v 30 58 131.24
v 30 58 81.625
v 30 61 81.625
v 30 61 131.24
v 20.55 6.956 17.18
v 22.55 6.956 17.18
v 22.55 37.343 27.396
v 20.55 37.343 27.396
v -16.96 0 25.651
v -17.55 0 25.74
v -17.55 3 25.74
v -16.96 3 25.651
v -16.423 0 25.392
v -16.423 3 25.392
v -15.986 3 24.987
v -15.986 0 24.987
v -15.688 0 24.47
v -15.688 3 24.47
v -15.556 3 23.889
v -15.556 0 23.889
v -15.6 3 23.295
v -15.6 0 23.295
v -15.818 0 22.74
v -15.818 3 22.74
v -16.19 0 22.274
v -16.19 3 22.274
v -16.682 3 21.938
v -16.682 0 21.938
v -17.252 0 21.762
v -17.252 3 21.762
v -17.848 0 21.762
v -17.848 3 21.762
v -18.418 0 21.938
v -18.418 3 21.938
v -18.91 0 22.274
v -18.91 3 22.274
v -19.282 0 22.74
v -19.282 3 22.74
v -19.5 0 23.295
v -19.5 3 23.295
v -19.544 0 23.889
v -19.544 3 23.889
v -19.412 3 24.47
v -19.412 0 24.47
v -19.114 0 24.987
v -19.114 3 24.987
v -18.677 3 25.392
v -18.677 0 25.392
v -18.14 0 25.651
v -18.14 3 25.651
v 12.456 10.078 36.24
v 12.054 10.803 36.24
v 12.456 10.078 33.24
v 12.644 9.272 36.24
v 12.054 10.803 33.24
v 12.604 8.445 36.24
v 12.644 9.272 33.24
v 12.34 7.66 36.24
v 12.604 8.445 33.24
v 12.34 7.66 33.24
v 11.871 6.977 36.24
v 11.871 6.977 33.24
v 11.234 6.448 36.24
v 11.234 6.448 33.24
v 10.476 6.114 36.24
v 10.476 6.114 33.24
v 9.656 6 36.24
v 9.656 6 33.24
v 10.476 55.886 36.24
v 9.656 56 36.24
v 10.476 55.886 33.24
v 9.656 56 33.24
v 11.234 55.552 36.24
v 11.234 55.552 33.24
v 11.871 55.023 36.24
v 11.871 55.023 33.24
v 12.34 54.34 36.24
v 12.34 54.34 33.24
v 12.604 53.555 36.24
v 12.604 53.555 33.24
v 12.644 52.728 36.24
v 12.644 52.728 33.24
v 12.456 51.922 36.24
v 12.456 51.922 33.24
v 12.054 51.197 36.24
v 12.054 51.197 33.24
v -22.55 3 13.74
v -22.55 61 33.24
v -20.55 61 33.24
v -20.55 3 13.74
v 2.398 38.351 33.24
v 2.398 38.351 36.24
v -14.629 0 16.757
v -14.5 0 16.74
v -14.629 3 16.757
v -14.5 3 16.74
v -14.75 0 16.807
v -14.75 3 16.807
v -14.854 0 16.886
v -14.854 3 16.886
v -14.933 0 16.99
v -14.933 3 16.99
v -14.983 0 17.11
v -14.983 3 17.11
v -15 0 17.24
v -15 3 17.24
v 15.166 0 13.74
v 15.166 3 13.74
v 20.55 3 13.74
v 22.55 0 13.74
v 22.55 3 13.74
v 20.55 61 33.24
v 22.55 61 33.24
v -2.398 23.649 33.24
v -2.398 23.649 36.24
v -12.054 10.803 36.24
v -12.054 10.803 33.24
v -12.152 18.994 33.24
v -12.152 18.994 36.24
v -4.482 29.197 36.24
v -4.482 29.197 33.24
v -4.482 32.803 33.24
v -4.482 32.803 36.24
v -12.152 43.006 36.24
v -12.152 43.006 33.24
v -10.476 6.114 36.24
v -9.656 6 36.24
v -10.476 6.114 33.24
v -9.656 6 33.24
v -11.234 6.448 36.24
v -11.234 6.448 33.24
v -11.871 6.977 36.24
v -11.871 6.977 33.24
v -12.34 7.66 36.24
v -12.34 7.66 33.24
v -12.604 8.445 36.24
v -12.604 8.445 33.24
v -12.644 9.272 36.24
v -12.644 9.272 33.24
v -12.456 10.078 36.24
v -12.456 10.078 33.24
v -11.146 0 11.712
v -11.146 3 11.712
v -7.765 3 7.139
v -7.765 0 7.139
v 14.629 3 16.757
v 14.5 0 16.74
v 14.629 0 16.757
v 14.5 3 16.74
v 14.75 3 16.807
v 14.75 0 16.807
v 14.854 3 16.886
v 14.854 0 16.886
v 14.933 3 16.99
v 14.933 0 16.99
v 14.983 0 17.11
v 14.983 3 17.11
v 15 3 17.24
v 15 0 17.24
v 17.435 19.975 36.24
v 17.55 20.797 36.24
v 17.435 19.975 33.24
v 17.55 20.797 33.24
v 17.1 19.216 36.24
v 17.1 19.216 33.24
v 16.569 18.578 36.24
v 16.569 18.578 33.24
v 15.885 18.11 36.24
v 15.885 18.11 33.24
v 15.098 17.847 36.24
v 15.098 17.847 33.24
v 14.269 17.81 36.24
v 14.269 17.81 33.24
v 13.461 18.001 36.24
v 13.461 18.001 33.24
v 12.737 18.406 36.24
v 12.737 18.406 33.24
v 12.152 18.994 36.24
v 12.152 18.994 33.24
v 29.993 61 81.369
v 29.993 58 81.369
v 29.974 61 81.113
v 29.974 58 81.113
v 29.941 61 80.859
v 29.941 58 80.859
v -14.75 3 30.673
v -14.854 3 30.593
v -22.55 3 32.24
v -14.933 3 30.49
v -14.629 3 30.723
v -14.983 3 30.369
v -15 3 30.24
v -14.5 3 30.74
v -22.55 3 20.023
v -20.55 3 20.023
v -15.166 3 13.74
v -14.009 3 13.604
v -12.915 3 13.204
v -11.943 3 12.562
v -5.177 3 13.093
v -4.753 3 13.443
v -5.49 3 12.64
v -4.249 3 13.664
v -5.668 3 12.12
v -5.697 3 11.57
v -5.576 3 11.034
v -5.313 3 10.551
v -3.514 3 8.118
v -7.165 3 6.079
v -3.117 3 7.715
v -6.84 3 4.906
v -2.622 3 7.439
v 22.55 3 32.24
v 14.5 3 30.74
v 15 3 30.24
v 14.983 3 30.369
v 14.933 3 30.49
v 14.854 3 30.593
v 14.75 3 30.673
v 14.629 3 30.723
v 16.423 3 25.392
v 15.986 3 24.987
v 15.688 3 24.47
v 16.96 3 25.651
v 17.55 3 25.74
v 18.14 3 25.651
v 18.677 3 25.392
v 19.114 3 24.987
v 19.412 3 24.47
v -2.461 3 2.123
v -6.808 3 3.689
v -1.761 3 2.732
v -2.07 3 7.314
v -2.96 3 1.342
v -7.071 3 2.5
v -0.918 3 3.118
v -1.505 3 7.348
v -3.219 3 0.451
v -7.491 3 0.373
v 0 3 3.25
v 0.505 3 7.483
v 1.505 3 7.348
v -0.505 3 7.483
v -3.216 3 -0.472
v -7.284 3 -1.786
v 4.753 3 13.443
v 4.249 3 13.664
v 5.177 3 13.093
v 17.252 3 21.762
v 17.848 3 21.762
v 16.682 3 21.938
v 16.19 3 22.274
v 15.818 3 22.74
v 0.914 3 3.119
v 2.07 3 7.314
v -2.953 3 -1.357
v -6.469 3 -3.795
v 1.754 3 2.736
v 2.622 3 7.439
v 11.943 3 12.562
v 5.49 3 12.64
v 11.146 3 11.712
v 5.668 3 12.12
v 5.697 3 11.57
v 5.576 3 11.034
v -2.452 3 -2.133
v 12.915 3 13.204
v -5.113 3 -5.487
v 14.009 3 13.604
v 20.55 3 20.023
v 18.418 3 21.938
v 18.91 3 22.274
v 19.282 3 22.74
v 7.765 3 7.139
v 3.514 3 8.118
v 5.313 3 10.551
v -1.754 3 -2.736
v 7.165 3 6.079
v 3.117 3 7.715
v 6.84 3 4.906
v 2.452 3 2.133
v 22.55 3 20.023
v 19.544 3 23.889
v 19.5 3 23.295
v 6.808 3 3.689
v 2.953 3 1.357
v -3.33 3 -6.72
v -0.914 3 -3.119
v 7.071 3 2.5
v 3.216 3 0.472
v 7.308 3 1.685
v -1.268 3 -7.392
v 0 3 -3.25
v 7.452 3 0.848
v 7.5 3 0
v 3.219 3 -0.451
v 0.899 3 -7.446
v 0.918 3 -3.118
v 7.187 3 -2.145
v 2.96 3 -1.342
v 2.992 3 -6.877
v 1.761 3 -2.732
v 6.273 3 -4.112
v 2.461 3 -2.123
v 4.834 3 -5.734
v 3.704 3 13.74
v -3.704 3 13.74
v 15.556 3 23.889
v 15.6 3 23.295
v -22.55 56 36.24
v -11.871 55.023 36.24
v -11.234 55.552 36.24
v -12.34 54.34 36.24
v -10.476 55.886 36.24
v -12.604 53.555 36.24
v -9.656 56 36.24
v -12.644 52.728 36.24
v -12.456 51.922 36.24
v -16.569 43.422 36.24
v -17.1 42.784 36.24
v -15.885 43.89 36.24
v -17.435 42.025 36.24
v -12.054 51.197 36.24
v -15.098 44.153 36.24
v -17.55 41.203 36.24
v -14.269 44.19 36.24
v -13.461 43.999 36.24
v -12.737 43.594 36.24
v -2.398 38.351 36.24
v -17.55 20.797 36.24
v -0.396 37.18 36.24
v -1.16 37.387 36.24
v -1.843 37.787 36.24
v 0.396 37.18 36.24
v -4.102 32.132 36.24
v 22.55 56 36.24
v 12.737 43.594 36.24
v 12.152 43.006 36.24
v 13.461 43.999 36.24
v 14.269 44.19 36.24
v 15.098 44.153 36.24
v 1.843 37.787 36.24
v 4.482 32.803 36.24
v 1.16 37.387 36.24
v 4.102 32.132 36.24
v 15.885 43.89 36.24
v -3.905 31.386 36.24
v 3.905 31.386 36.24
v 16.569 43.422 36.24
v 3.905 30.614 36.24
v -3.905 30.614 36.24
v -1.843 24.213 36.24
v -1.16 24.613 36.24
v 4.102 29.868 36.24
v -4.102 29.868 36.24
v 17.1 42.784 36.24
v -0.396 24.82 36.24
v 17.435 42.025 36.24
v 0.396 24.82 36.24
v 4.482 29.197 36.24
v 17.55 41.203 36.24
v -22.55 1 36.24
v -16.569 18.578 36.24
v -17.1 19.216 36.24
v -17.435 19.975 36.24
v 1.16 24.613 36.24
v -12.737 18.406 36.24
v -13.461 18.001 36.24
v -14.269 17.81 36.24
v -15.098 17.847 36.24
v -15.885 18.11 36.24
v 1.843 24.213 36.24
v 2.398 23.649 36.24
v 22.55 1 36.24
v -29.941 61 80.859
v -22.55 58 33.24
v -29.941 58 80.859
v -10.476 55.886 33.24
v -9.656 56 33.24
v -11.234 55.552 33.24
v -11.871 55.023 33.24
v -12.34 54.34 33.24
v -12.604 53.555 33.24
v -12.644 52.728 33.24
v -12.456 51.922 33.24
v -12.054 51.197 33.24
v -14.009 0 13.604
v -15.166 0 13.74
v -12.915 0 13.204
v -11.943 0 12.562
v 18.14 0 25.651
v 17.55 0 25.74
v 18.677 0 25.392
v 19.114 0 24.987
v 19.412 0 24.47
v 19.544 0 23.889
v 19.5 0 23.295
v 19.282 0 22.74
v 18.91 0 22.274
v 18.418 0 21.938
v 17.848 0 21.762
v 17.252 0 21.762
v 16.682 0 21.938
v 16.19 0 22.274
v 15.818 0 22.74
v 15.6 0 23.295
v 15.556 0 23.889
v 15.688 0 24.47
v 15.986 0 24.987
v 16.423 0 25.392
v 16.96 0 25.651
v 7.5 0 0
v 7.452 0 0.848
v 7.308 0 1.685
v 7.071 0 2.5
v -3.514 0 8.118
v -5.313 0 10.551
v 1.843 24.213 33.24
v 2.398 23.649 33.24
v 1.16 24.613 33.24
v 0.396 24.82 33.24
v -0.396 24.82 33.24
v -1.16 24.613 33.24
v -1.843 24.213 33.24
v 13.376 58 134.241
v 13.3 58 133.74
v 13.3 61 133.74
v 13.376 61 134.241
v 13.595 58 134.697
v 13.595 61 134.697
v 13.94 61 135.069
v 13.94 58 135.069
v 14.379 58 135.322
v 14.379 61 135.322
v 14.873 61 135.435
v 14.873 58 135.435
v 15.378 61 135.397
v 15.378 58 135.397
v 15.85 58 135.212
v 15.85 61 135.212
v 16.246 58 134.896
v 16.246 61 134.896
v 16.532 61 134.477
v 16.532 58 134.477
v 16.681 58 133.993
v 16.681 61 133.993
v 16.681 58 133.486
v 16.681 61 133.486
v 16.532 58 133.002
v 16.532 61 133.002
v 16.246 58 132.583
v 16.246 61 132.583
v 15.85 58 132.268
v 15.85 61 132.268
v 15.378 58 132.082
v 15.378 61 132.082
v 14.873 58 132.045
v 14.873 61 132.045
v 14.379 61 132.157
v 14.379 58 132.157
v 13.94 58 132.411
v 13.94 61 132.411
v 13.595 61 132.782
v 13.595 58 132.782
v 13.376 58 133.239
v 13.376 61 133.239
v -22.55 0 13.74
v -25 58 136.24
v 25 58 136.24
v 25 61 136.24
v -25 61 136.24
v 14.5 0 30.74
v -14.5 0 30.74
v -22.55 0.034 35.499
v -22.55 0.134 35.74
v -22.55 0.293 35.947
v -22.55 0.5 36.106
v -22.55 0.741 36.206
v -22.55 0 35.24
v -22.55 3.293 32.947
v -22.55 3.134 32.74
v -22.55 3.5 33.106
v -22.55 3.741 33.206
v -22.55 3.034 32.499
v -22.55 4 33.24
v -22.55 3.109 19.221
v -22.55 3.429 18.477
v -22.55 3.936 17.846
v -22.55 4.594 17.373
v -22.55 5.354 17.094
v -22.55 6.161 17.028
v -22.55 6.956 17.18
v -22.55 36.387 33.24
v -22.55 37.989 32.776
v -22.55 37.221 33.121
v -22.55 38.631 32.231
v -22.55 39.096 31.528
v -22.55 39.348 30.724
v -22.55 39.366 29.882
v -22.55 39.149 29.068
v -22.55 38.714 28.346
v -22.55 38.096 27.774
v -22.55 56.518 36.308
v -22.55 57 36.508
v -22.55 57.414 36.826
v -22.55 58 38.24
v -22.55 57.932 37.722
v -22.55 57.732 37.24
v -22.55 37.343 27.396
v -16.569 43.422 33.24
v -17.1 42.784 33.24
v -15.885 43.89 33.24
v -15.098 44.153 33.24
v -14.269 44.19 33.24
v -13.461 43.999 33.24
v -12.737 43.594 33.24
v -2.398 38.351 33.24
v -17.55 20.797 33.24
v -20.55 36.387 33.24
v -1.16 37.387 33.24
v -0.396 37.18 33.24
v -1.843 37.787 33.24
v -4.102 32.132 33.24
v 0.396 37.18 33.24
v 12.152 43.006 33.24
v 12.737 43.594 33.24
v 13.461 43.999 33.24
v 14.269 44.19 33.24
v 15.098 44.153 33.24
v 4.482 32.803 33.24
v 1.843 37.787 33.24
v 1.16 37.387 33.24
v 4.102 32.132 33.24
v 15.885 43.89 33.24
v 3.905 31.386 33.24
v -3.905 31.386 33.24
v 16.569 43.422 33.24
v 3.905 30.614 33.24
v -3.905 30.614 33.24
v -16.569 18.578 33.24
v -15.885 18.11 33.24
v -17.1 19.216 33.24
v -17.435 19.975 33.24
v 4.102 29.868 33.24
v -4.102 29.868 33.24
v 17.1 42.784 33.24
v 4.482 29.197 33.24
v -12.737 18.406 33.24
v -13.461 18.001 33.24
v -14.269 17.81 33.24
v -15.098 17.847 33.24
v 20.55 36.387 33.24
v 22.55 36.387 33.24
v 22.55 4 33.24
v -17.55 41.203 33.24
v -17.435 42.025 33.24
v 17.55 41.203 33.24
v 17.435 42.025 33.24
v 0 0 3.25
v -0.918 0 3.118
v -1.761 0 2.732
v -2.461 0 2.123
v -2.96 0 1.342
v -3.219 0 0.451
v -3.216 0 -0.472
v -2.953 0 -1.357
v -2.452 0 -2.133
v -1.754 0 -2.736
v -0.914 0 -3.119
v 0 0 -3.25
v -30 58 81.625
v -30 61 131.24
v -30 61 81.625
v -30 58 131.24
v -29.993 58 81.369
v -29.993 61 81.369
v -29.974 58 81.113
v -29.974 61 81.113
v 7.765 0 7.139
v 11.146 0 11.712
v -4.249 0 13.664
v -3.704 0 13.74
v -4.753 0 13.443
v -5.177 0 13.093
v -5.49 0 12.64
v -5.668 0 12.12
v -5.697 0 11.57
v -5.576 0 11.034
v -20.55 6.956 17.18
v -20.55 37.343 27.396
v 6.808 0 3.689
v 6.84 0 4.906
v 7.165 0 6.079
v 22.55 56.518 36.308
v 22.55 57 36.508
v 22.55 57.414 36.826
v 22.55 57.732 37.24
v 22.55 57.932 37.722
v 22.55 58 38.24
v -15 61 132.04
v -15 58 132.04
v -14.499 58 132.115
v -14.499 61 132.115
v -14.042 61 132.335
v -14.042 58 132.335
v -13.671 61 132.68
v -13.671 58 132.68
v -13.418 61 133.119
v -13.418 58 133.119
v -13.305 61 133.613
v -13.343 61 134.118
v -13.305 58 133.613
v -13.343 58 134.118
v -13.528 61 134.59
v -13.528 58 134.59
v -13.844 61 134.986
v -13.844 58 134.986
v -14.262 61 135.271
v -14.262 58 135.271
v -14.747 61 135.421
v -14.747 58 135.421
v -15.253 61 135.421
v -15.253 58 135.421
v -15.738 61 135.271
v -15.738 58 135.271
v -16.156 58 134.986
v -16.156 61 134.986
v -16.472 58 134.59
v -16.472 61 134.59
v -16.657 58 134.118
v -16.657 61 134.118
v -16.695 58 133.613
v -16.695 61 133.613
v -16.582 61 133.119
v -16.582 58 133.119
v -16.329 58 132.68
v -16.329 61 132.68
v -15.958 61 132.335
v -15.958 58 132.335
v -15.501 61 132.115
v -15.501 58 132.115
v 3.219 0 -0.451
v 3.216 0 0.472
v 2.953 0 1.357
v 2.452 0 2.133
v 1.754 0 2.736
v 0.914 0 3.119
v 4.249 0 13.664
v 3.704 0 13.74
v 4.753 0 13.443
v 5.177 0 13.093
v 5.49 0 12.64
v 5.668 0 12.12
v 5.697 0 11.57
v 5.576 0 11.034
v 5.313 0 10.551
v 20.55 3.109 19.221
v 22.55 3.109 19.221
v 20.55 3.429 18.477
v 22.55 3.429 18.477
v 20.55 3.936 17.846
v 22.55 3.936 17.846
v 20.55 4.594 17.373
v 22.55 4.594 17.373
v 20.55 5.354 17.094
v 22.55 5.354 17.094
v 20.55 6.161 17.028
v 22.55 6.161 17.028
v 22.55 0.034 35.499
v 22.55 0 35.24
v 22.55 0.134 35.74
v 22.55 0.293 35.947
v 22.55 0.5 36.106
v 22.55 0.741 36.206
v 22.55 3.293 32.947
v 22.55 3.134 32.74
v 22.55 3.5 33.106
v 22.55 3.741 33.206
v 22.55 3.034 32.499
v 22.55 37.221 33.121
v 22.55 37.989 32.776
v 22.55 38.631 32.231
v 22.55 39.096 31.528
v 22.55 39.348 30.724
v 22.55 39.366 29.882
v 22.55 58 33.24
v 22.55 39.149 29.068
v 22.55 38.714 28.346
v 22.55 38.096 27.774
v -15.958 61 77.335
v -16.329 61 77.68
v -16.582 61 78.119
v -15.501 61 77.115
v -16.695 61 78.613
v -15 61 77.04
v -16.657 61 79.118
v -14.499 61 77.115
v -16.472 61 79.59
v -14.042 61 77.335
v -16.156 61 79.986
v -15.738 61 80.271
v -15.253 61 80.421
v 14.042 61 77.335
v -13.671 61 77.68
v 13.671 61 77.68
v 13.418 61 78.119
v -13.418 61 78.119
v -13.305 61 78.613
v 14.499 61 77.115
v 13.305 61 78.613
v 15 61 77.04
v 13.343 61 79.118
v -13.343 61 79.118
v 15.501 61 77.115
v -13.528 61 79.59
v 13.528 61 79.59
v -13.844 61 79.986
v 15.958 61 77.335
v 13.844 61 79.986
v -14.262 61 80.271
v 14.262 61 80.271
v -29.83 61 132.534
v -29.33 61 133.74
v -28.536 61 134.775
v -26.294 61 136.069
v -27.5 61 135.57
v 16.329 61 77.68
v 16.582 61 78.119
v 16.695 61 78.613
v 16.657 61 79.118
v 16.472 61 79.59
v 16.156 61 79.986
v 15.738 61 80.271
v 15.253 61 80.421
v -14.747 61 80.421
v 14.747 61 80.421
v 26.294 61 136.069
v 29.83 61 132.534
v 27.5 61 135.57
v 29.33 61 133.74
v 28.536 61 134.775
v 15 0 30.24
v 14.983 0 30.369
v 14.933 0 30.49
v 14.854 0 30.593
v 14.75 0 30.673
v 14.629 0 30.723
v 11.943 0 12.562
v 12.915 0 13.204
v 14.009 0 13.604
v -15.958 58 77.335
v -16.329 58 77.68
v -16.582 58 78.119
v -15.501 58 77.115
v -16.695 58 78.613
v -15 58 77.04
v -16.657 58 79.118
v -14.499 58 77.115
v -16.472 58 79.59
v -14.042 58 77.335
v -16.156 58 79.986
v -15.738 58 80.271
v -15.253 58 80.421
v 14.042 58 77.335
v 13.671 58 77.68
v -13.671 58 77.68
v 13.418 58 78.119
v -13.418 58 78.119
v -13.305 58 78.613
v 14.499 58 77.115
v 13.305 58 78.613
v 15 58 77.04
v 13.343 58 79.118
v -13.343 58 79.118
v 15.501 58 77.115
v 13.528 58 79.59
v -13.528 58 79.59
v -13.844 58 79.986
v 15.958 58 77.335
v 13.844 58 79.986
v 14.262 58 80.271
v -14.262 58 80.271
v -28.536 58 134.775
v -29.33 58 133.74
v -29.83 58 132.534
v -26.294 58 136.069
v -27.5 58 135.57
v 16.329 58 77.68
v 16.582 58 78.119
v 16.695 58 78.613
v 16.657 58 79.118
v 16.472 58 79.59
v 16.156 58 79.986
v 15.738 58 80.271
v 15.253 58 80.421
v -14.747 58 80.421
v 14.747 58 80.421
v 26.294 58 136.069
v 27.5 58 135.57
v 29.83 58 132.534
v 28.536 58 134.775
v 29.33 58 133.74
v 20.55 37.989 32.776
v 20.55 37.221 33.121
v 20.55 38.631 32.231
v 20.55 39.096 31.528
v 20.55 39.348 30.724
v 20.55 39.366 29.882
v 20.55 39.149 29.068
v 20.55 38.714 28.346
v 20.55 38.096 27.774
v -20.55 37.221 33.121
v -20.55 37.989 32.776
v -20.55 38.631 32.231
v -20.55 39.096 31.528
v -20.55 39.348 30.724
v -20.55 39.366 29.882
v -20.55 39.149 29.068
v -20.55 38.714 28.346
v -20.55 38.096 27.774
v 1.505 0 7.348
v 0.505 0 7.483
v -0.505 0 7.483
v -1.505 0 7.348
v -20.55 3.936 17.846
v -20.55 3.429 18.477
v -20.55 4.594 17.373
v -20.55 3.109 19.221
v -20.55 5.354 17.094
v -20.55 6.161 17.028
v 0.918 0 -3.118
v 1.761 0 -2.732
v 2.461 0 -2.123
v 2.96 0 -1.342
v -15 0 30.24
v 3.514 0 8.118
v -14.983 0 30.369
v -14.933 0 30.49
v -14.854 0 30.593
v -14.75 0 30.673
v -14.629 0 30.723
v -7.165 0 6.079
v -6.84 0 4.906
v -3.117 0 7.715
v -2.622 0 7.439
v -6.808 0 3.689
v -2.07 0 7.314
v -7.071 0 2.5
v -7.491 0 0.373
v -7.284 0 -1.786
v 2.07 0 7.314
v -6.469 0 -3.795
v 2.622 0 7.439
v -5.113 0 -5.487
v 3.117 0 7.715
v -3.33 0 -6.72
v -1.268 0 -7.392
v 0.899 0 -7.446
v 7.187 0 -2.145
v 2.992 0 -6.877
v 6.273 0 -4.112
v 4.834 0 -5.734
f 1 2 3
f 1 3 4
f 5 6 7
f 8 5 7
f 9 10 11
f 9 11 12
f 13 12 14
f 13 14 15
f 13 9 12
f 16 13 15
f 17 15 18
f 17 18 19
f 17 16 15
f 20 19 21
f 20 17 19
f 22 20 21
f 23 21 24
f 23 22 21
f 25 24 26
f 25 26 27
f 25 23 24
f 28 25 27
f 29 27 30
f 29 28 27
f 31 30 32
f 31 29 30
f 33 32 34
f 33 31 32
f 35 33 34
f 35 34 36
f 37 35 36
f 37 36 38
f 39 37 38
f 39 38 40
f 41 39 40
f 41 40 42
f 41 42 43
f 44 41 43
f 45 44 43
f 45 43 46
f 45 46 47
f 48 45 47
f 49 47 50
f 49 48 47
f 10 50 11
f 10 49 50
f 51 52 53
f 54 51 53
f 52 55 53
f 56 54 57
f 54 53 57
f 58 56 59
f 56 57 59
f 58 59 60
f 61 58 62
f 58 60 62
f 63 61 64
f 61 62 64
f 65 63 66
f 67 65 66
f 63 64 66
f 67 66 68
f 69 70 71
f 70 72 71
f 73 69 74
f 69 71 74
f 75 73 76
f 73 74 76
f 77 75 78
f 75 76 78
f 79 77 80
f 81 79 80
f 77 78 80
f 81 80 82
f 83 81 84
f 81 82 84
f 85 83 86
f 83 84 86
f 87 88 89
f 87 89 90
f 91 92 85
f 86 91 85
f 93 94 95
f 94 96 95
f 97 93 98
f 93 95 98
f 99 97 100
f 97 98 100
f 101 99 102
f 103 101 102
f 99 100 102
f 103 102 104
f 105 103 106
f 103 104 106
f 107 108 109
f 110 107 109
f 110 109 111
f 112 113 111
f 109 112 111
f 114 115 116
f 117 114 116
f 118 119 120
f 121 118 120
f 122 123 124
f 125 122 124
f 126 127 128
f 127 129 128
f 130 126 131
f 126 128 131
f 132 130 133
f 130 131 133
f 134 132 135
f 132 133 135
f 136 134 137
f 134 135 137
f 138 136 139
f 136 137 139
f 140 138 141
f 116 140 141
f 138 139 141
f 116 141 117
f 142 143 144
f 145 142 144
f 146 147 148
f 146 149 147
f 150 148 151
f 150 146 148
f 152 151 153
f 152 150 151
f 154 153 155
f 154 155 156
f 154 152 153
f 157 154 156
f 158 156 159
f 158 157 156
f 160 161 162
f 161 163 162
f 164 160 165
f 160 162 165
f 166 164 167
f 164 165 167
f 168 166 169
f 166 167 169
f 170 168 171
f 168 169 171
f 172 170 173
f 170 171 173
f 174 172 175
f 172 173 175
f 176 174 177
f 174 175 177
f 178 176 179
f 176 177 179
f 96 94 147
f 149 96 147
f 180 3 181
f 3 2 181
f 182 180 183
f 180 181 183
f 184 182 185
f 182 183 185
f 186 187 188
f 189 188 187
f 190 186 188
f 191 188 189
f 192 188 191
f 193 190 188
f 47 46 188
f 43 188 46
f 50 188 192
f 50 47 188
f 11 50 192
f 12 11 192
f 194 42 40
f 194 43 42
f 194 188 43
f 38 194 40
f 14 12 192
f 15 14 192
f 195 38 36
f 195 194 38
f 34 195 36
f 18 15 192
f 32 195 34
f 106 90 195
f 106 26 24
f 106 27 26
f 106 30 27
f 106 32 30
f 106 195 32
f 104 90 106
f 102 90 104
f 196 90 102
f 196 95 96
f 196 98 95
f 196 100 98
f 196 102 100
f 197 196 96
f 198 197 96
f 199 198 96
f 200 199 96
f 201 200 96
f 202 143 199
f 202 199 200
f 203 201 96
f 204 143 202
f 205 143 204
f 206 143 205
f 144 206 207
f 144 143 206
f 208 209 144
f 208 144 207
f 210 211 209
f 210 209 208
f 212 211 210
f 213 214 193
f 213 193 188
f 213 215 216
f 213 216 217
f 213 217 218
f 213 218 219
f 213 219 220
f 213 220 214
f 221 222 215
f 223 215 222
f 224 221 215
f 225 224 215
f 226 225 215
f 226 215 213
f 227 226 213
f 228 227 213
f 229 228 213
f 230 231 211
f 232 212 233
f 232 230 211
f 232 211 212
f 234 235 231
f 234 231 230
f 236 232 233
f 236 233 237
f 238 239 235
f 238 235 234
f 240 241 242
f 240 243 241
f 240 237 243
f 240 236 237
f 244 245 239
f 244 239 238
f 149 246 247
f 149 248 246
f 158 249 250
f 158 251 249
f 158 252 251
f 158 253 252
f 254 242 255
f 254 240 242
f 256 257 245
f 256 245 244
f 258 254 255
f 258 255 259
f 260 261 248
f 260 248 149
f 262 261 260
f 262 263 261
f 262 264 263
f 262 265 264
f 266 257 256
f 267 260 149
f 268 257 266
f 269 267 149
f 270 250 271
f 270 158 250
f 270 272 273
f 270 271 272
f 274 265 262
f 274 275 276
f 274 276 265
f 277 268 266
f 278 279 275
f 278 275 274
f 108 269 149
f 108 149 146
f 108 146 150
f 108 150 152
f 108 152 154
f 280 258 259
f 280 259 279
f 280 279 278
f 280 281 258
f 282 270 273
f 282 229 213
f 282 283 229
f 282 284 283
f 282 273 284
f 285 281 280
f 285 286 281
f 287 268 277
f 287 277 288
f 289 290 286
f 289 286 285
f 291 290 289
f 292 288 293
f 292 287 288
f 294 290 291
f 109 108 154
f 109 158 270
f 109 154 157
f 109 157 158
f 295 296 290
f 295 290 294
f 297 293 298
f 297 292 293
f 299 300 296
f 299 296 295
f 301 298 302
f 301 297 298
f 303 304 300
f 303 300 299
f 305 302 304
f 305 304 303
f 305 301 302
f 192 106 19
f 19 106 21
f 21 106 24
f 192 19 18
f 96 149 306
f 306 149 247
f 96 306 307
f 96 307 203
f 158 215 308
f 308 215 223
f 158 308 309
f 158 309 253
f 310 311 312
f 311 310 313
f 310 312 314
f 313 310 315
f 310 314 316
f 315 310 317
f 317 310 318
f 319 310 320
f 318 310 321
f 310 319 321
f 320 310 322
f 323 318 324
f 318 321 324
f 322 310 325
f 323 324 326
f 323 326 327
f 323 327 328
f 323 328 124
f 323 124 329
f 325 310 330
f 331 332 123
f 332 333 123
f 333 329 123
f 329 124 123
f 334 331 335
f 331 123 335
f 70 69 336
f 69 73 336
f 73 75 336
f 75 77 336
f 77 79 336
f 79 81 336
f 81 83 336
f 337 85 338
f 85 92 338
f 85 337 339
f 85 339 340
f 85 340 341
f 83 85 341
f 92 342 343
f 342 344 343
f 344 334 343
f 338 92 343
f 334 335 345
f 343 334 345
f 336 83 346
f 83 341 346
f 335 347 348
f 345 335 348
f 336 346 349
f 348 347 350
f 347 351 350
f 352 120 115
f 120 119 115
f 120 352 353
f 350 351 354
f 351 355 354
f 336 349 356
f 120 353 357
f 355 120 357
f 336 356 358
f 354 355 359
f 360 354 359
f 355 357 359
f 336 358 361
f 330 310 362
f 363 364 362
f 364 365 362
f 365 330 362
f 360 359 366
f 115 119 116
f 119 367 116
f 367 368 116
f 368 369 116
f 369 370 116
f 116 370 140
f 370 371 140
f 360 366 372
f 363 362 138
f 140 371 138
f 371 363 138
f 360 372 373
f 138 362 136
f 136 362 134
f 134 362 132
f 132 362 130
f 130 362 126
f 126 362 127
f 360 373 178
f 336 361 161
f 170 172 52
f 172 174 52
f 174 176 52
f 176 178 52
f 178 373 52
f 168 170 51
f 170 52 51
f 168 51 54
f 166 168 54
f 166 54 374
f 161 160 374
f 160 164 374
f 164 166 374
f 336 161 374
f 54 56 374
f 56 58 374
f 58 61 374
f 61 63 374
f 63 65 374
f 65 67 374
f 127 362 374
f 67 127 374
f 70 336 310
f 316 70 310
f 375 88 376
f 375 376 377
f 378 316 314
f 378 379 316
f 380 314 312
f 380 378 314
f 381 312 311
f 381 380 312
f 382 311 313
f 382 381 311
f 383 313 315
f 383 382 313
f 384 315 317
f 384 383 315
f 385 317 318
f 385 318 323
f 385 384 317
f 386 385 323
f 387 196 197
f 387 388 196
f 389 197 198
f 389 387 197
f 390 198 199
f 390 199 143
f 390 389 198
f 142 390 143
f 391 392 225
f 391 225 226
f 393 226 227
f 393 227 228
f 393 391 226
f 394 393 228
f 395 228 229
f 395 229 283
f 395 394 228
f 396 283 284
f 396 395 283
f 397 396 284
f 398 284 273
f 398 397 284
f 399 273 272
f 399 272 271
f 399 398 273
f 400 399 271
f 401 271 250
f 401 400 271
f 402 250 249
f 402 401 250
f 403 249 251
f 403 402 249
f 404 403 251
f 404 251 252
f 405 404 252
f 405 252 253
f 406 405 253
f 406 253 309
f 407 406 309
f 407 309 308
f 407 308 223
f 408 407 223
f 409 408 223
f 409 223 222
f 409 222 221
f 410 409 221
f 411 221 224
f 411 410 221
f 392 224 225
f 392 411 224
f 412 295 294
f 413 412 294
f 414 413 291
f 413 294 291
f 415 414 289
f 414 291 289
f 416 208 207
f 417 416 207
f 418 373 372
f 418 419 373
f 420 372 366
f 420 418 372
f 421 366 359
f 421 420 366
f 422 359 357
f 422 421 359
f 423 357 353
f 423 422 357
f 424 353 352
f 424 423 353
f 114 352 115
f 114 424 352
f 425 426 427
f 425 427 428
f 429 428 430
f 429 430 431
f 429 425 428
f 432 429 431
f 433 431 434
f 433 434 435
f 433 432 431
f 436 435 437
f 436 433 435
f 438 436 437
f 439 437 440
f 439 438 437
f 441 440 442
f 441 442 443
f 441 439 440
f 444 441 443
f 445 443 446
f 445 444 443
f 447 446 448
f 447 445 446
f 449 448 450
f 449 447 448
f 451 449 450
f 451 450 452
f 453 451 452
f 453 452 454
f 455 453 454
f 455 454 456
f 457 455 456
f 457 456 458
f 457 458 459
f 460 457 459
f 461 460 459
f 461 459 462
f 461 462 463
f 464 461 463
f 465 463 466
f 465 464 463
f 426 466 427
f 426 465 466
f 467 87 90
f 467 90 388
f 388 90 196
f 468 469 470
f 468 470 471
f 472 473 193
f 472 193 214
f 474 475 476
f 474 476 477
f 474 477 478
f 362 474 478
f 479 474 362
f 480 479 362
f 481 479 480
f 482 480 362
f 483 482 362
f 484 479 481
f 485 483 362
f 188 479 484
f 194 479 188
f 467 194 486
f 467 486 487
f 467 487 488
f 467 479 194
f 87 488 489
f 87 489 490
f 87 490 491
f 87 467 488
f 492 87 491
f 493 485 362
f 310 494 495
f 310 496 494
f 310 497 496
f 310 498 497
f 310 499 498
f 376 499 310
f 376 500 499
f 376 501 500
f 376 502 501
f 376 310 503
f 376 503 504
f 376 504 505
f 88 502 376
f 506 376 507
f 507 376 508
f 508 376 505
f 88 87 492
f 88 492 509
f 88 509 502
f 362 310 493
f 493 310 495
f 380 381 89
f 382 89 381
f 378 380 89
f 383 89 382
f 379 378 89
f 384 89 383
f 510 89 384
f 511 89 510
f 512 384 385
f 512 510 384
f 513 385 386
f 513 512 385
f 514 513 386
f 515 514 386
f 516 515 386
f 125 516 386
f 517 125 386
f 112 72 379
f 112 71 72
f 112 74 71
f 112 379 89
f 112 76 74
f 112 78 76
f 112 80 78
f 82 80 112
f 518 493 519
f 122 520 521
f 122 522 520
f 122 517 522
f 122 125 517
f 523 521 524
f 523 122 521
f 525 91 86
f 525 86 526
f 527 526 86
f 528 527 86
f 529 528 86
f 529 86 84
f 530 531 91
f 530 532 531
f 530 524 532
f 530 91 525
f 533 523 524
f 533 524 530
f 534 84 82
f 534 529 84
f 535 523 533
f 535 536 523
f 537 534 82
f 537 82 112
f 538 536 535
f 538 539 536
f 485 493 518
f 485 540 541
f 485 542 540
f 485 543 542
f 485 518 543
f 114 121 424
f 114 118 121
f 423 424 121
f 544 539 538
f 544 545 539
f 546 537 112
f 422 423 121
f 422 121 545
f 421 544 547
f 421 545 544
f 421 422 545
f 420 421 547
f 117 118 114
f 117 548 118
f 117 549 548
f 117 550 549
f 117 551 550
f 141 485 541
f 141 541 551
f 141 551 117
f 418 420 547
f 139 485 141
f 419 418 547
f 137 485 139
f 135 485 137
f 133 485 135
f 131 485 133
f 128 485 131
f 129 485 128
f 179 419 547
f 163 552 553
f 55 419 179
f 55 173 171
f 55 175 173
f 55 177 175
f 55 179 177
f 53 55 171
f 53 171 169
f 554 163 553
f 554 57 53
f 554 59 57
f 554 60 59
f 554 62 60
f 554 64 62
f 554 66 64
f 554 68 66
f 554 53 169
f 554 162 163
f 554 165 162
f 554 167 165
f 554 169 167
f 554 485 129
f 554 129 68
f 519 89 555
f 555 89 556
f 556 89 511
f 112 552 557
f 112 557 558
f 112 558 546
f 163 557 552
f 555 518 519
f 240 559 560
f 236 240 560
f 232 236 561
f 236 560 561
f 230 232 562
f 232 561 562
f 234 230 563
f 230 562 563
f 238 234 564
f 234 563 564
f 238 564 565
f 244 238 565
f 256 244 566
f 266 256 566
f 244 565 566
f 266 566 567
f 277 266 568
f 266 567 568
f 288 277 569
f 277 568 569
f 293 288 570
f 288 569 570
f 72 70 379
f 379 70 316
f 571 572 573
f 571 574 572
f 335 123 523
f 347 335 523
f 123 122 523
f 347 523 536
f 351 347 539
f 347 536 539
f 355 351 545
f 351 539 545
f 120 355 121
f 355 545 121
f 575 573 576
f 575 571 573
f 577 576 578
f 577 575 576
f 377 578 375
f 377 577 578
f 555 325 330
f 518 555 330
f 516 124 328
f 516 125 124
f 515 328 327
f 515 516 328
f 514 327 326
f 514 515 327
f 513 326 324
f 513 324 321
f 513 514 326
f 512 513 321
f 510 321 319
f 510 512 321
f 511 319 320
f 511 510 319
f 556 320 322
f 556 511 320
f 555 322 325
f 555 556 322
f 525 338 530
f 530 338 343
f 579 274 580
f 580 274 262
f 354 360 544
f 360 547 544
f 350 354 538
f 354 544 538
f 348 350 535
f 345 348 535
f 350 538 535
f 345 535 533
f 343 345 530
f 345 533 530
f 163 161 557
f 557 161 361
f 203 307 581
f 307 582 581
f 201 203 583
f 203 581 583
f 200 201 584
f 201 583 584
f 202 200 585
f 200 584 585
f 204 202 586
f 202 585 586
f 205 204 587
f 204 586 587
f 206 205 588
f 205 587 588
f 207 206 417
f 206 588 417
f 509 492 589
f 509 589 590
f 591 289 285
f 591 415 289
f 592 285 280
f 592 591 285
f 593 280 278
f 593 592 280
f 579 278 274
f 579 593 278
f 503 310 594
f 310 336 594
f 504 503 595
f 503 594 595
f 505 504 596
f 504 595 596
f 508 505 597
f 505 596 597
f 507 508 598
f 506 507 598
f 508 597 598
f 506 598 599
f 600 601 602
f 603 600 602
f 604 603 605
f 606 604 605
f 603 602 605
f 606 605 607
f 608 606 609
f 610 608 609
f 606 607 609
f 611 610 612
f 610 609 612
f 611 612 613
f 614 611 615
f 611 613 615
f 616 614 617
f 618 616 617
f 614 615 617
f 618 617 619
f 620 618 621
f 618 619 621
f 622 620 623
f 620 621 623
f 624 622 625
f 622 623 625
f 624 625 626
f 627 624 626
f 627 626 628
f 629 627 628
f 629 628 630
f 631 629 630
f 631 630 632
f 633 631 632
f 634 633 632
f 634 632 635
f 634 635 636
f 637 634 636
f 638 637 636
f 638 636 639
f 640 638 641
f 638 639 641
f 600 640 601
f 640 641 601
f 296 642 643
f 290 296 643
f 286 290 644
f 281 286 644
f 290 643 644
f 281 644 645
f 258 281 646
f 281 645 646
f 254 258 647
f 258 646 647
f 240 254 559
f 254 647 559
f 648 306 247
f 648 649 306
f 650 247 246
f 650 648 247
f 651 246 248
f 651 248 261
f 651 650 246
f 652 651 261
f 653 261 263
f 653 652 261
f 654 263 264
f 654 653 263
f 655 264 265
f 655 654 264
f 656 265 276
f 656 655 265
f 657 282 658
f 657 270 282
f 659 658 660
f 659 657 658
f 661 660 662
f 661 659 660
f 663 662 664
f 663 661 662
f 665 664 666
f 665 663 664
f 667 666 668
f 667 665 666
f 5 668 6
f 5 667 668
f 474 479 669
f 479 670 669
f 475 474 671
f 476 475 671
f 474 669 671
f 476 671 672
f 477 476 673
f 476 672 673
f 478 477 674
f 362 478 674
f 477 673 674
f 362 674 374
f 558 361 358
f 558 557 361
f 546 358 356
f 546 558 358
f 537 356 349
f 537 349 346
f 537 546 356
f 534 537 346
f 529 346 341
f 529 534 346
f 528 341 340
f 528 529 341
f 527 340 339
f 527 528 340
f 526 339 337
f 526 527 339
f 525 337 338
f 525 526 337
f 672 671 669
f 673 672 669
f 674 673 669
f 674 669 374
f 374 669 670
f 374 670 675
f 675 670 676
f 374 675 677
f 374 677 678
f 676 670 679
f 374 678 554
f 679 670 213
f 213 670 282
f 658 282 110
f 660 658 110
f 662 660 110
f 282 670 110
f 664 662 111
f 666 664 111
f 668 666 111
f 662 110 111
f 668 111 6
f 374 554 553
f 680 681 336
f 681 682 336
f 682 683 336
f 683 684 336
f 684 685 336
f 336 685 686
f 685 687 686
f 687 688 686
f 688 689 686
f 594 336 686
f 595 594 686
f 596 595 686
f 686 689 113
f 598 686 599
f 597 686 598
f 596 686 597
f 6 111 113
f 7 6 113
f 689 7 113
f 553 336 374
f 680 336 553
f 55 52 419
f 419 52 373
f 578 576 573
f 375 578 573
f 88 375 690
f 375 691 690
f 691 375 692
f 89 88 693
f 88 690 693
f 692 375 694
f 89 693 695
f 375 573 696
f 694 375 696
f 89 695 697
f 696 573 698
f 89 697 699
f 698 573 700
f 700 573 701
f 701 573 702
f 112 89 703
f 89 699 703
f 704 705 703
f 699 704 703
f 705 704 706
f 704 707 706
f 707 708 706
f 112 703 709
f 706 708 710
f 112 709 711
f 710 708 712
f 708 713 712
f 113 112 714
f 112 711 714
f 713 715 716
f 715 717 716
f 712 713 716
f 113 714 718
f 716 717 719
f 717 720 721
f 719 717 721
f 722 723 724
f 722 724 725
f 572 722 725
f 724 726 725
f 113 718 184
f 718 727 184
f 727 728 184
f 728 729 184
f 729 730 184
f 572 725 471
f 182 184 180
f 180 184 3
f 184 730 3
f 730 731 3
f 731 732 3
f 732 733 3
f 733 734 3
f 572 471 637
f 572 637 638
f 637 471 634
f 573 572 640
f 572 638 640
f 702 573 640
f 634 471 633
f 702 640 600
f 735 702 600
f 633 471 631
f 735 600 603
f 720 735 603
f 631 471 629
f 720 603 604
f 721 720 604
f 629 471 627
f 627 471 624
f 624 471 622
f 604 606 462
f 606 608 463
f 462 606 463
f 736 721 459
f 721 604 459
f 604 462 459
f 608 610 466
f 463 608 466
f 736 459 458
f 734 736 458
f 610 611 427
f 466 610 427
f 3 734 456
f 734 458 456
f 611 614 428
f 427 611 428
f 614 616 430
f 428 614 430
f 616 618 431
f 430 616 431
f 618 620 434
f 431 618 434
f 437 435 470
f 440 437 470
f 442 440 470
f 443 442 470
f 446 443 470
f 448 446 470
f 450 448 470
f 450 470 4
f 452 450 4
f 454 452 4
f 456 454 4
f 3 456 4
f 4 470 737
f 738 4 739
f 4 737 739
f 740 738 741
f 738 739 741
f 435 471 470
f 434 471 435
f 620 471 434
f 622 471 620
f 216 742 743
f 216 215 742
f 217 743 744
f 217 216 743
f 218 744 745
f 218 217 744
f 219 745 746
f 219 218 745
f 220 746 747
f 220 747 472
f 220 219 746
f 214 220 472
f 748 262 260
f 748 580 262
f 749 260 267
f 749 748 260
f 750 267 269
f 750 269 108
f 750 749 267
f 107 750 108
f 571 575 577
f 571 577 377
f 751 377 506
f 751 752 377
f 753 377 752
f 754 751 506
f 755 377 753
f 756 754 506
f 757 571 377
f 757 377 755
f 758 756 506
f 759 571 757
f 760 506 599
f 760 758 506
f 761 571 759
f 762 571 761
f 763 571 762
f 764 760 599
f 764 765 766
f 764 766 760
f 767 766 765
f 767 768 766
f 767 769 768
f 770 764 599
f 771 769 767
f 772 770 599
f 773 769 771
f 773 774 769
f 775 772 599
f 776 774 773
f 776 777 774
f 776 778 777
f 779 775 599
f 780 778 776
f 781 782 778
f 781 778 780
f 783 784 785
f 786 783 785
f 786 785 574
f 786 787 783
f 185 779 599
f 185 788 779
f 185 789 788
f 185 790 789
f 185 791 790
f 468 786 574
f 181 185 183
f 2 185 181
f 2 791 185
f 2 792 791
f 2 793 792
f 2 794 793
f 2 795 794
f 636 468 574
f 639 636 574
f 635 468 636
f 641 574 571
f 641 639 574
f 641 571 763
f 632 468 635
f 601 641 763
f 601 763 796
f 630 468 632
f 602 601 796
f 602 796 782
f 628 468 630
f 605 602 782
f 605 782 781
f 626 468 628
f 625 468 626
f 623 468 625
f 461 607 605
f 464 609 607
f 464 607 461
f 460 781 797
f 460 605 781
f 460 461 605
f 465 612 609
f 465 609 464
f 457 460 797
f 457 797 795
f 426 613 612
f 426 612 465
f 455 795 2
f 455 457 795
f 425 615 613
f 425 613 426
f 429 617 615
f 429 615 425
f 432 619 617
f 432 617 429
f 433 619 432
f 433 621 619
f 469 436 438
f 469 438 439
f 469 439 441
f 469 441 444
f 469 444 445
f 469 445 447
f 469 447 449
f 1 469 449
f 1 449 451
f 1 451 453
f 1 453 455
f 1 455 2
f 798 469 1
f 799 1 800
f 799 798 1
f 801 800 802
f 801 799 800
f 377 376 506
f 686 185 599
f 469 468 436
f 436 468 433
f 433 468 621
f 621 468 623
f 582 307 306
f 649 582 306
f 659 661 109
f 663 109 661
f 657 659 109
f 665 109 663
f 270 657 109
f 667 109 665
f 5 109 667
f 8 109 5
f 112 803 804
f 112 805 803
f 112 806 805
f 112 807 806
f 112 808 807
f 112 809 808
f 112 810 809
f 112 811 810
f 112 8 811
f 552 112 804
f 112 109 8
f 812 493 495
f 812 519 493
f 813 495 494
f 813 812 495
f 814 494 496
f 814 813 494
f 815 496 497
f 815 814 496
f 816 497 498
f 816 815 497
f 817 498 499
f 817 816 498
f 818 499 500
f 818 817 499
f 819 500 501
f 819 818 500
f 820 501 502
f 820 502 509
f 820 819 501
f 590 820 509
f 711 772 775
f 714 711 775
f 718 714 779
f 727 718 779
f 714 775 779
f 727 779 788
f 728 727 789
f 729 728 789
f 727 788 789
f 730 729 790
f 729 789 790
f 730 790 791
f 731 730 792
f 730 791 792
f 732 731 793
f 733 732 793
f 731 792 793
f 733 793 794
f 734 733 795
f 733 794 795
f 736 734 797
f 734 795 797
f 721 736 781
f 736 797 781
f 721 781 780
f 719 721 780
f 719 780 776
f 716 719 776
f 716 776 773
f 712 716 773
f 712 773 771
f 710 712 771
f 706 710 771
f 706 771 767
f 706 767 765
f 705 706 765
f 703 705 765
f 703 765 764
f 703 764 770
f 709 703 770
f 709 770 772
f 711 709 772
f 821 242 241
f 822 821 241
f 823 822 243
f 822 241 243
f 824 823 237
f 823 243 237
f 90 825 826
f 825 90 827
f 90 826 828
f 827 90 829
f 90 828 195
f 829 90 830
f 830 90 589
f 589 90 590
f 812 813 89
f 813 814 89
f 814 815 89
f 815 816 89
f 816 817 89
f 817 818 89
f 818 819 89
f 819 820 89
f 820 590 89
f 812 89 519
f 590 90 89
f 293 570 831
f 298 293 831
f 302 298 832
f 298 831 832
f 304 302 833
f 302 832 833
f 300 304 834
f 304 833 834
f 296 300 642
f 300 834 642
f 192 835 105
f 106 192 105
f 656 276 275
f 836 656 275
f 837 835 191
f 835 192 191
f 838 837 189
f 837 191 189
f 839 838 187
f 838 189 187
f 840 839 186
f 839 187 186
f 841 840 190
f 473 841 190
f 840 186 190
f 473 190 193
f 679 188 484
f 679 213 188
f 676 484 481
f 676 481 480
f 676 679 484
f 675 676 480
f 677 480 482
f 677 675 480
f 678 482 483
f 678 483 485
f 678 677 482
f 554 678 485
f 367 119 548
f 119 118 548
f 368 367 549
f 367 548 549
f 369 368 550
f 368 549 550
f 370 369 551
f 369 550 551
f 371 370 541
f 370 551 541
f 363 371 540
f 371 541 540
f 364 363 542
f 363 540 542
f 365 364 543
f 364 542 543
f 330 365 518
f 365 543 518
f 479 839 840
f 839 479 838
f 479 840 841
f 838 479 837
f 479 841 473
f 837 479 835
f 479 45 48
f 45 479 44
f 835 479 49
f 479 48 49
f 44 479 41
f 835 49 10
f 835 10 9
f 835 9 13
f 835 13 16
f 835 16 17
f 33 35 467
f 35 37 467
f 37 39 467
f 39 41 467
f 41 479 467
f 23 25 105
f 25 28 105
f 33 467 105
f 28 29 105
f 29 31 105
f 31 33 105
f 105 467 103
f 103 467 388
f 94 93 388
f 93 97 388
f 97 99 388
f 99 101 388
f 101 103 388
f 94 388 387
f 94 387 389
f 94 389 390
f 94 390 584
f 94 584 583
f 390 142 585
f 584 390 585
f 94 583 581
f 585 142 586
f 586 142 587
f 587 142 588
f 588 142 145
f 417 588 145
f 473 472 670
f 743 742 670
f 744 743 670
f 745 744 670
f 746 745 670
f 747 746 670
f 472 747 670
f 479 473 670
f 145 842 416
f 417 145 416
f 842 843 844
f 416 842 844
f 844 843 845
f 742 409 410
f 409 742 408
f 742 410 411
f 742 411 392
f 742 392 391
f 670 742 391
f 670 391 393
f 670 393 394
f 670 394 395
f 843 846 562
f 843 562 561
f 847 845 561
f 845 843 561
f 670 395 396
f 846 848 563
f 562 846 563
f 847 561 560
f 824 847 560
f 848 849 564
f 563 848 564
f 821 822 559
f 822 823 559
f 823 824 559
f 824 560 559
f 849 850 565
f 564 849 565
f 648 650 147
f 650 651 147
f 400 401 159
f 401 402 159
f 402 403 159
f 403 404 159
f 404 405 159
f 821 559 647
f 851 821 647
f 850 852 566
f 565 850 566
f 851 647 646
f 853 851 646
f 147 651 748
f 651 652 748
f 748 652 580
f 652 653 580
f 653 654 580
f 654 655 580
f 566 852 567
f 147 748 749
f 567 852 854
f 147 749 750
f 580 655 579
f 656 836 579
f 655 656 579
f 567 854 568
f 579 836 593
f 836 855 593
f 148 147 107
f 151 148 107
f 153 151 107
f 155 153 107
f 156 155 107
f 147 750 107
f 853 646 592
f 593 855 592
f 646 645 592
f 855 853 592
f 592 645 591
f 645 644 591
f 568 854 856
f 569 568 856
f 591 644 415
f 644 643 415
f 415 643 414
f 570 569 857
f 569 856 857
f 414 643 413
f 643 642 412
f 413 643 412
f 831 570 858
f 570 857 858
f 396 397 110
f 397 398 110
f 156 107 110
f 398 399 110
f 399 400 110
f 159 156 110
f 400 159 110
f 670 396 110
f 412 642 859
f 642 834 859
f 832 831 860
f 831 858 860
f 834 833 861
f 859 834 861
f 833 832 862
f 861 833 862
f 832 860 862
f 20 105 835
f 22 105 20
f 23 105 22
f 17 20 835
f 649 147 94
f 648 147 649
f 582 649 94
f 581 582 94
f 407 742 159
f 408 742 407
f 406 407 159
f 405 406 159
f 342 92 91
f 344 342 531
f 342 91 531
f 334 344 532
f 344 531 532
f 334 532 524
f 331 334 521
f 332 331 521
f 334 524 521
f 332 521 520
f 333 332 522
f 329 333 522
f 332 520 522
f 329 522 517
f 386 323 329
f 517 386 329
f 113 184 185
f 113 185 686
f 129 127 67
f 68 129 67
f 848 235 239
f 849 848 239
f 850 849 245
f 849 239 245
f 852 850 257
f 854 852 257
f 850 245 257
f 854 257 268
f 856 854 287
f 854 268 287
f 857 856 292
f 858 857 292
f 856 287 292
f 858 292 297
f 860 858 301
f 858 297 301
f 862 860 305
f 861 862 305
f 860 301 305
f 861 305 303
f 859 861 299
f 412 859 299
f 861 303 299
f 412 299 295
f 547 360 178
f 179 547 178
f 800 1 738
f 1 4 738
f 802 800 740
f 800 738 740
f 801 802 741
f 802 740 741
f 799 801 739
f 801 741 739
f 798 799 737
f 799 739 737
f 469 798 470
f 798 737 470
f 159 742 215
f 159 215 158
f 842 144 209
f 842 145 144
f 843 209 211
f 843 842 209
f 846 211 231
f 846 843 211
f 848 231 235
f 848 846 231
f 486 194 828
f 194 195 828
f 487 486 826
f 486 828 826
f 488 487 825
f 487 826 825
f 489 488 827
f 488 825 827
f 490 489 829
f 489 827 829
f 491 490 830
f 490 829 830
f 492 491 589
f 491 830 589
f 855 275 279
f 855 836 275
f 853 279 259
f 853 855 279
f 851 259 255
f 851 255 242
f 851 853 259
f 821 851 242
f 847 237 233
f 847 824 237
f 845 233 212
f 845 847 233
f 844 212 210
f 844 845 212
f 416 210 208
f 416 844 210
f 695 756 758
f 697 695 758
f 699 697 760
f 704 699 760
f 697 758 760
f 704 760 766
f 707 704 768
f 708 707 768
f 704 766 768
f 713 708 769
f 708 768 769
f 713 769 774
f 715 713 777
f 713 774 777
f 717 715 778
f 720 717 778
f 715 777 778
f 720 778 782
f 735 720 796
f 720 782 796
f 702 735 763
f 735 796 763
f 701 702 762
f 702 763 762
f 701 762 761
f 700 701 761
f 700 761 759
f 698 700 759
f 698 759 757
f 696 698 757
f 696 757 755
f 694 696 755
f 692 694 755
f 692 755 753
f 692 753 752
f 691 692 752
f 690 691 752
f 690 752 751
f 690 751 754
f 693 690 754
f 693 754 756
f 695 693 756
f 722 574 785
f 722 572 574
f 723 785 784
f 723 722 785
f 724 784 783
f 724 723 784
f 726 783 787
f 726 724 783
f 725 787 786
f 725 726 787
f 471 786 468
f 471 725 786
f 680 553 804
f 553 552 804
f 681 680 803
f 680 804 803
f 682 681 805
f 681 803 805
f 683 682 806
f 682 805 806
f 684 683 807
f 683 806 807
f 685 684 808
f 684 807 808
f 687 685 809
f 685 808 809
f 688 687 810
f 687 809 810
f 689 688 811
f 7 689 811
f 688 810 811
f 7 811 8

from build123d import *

# Parameters (mm, degrees)
SKETCH1_R           = 2
SKETCH1_W           = 30
SKETCH1_H           = 14
BOSS_EXTRUDE1_DEPTH = 3
CUT_EXTRUDE1_DEPTH  = 3
FILLET1_R           = 5
FILLET2_R           = 2
SKETCH3_W           = 45.1
SKETCH3_H           = 3
BOSS_EXTRUDE2_DEPTH = 58
FILLET3_R           = 0.5
FILLET4_R           = 1
CUT_EXTRUDE2_DEPTH  = 10
FILLET5_R           = 3
BOSS_EXTRUDE3_DEPTH = 2
FILLET6_R           = 3
SKETCH6_W           = 45.1
SKETCH6_H           = 3
BOSS_EXTRUDE4_DEPTH = 45
FILLET8_R           = 2
SKETCH7_R           = 1.7
CUT_EXTRUDE3_DEPTH  = 10
BOSS_EXTRUDE5_DEPTH = 3
SKETCH10_R          = 1.7
BOSS_EXTRUDE6_DEPTH = 3
FILLET12_R          = 5


with BuildPart() as part:
    # Sketch1 → Boss-Extrude1 (new body)
    with BuildSketch(Plane(origin=(0, 0, 0), x_dir=(1, 0, 0), z_dir=(0, 1, 0))):
        Polygon((0, 10), (-22.55, 10), (-22.55, -36.239750654), (22.55, -36.239750654), (22.55, 10), align=None)
        with Locations(Location((-17.55, -23.739750654, 0), (0, 0, 270))):
            Circle(SKETCH1_R, mode=Mode.SUBTRACT)
        with Locations((0, -23.739750654)):
            Rectangle(SKETCH1_W, SKETCH1_H, mode=Mode.SUBTRACT)
        with BuildLine():
            ThreePointArc((-3.218514532, -0.451291712), (-2.452467947, 2.132580824), (0, 3.25))
            ThreePointArc((0, 3.25), (2.132580824, 2.452467947), (3.218514532, 0.451291712))
            ThreePointArc((3.218514532, 0.451291712), (2.452467947, -2.132580824), (0, -3.25))
            ThreePointArc((0, -3.25), (-2.132580824, -2.452467947), (-3.218514532, -0.451291712))
        make_face(mode=Mode.SUBTRACT)
        with Locations(Location((17.55, -23.739750654, 0), (0, 0, 270))):
            Circle(SKETCH1_R, mode=Mode.SUBTRACT)
    extrude(amount=BOSS_EXTRUDE1_DEPTH)

    # Sketch2 → Cut-Extrude1 (cut)
    with BuildSketch(Plane(origin=(0, 3, 0), x_dir=(1, 0, 0), z_dir=(0, 1, 0))):
        with BuildLine():
            Line((-22.55, 10), (-22.55, -13.739750654))
            Line((-22.55, -13.739750654), (-12.644514973, -13.739750654))
            Line((-12.644514973, -13.739750654), (-5.905264771, -4.623618495))
            ThreePointArc((-5.905264771, -4.623618495), (-2.445456421, 7.090115859), (7.5, 0))
            ThreePointArc((7.5, 0), (7.090115859, -2.445456421), (5.905264771, -4.623618495))
            Line((5.905264771, -4.623618495), (12.644514973, -13.739750654))
            Line((12.644514973, -13.739750654), (22.55, -13.739750654))
            Line((22.55, -13.739750654), (22.55, 10))
            Line((22.55, 10), (-22.55, 10))
        make_face()
        with BuildLine():
            Line((-7.670157029, -13.739750654), (7.670157029, -13.739750654))
            Line((7.670157029, -13.739750654), (2.68876926, -7.001465551))
            ThreePointArc((2.68876926, -7.001465551), (0, -7.5), (-2.68876926, -7.001465551))
            Line((-2.68876926, -7.001465551), (-7.670157029, -13.739750654))
        make_face()
    extrude(amount=-CUT_EXTRUDE1_DEPTH, mode=Mode.SUBTRACT)

    # Fillet1
    fillet1_edges = [part.edges().sort_by_distance(p)[0] for p in [
        (5.905264771, 1.5, 4.623618495),
        (-5.905264771, 1.5, 4.623618495),
        (-12.644514973, 1.5, 13.739750654),
        (12.644514973, 1.5, 13.739750654),
    ]]
    fillet(fillet1_edges, radius=FILLET1_R)

    # Fillet2
    fillet2_edges = [part.edges().sort_by_distance(p)[0] for p in [
        (-2.68876926, 1.5, 7.001465551),
        (2.68876926, 1.5, 7.001465551),
        (7.670157029, 1.5, 13.739750654),
        (-7.670157029, 1.5, 13.739750654),
    ]]
    fillet(fillet2_edges, radius=FILLET2_R)

    # Sketch3 → Boss-Extrude2 (add)
    with BuildSketch(Plane(origin=(0, 3, 0), x_dir=(1, 0, 0), z_dir=(0, 1, 0))):
        with Locations((0, -34.739750654)):
            Rectangle(SKETCH3_W, SKETCH3_H)
    extrude(amount=BOSS_EXTRUDE2_DEPTH)

    # Fillet3
    fillet3_edges = [part.edges().sort_by_distance(p)[0] for p in [
        (15, 1.5, 16.739750654),
        (-15, 1.5, 16.739750654),
        (-15, 1.5, 30.739750654),
        (15, 1.5, 30.739750654),
    ]]
    fillet(fillet3_edges, radius=FILLET3_R)

    # Fillet4
    fillet4_edges = [part.edges().sort_by_distance(p)[0] for p in [
        (0, 3, 33.239750654),
        (0, 0, 36.239750654),
    ]]
    fillet(fillet4_edges, radius=FILLET4_R)

    # Sketch4 → Cut-Extrude2 (cut)
    with BuildSketch(Plane.XY.offset(36.239750654)):
        Polygon((-3.127501776, 31), (-17.55, 50.187359056), (-17.55, 11.812640944), align=None)
        Polygon((15.66416489, 56), (-15.66416489, 56), (0, 35.160756243), align=None)
        Polygon((17.55, 11.812640944), (17.55, 50.187359056), (3.127501776, 31), align=None)
        Polygon((15.66416489, 6), (0, 26.839243757), (-15.66416489, 6), align=None)
    extrude(amount=-CUT_EXTRUDE2_DEPTH, mode=Mode.SUBTRACT)

    # Fillet5
    fillet5_edges = [part.edges().sort_by_distance(p)[0] for p in [
        (3.127501776, 31, 34.739750654),
        (17.55, 50.187359056, 34.739750654),
        (17.55, 11.812640944, 34.739750654),
        (-15.66416489, 56, 34.739750654),
        (15.66416489, 56, 34.739750654),
        (0, 35.160756243, 34.739750654),
        (0, 26.839243757, 34.739750654),
        (15.66416489, 6, 34.739750654),
        (-15.66416489, 6, 34.739750654),
        (-17.55, 50.187359056, 34.739750654),
        (-3.127501776, 31, 34.739750654),
        (-17.55, 11.812640944, 34.739750654),
    ]]
    fillet(fillet5_edges, radius=FILLET5_R)

    # Sketch5 → Boss-Extrude3 (add)
    with BuildSketch(Plane(origin=(22.55, 0, 0), x_dir=(0, 0, -1), z_dir=(1, 0, 0))):
        Polygon((-33.239750654, 61), (-13.739750654, 3), (-15.849760206, 3), (-33.239750654, 54.724074153), align=None)
    boss_extrude3 = extrude(amount=-BOSS_EXTRUDE3_DEPTH)

    # Mirror1: Boss-Extrude3 across plane
    add(boss_extrude3.mirror(Plane.ZY))

    # Fillet6
    fillet6_edges = [part.edges().sort_by_distance(p)[0] for p in [
        (21.55, 54.724074153, 33.239750654),
        (21.55, 3, 15.849760206),
        (-21.55, 54.724074153, 33.239750654),
        (-21.55, 3, 15.849760206),
    ]]
    fillet(fillet6_edges, radius=FILLET6_R)

    # Sketch6 → Boss-Extrude4 (add)
    with BuildSketch(Plane.XY.offset(36.239750654)):
        with Locations((0, 59.5)):
            Rectangle(SKETCH6_W, SKETCH6_H)
    extrude(amount=BOSS_EXTRUDE4_DEPTH)

    # Fillet8
    fillet8_edges = [part.edges().sort_by_distance(p)[0] for p in [
        (0, 58, 36.239750654),
    ]]
    fillet(fillet8_edges, radius=FILLET8_R - 0.0001)  # a hair under: the kernel refuses the full size

    # Sketch7 → Cut-Extrude3 (cut)
    with BuildSketch(Plane.XZ.offset(-58)):
        with Locations(Location((-15, 78.739750654, 0), (0, 0, 270))):
            Circle(SKETCH7_R)
        with Locations(Location((15, 78.739750654, 0), (0, 0, 270))):
            Circle(SKETCH7_R)
    extrude(amount=-CUT_EXTRUDE3_DEPTH, mode=Mode.SUBTRACT)

    # Sketch9 → Boss-Extrude5 (add)
    with BuildSketch(Plane(origin=(0, 61, 0), x_dir=(1, 0, 0), z_dir=(0, 1, 0))):
        Polygon((-22.55, -81.239750654), (-22.55, -33.239750654), (-30, -81.239750654), align=None)
        Polygon((-22.55, -81.239750654), (-30, -81.239750654), (-30, -131.239750654), (0, -131.239750654), (0, -81.239750654), align=None)
        Polygon((22.55, -81.239750654), (0, -81.239750654), (0, -131.239750654), (30, -131.239750654), (30, -81.239750654), align=None)
        Polygon((22.55, -33.239750654), (22.55, -81.239750654), (30, -81.239750654), align=None)
    extrude(amount=-BOSS_EXTRUDE5_DEPTH)

    # Sketch10 → Boss-Extrude6 (add)
    with BuildSketch(Plane.XZ.offset(-58)):
        Polygon((-30, 136.239750654), (-30, 131.239750654), (30, 131.239750654), (30, 136.239750654), (10.586303141, 136.239750654), (7.586303141, 136.239750654), (-21.497160634, 136.239750654), (-24.497160634, 136.239750654), align=None)
        with Locations(Location((-15, 133.739750654, 0), (0, 0, 270))):
            Circle(SKETCH10_R, mode=Mode.SUBTRACT)
        with BuildLine():
            ThreePointArc((16.7, 133.739750654), (15, 132.039750654), (13.3, 133.739750654))
            ThreePointArc((13.3, 133.739750654), (15, 135.439750654), (16.7, 133.739750654))
        make_face(mode=Mode.SUBTRACT)
    extrude(amount=-BOSS_EXTRUDE6_DEPTH)

    # Fillet12
    fillet12_edges = [part.edges().sort_by_distance(p)[0] for p in [
        (-30, 59.5, 81.239750654),
        (30, 59.5, 81.239750654),
        (-30, 59.5, 136.239750654),
        (30, 59.5, 136.239750654),
    ]]
    fillet(fillet12_edges, radius=FILLET12_R)


solid = part.part
